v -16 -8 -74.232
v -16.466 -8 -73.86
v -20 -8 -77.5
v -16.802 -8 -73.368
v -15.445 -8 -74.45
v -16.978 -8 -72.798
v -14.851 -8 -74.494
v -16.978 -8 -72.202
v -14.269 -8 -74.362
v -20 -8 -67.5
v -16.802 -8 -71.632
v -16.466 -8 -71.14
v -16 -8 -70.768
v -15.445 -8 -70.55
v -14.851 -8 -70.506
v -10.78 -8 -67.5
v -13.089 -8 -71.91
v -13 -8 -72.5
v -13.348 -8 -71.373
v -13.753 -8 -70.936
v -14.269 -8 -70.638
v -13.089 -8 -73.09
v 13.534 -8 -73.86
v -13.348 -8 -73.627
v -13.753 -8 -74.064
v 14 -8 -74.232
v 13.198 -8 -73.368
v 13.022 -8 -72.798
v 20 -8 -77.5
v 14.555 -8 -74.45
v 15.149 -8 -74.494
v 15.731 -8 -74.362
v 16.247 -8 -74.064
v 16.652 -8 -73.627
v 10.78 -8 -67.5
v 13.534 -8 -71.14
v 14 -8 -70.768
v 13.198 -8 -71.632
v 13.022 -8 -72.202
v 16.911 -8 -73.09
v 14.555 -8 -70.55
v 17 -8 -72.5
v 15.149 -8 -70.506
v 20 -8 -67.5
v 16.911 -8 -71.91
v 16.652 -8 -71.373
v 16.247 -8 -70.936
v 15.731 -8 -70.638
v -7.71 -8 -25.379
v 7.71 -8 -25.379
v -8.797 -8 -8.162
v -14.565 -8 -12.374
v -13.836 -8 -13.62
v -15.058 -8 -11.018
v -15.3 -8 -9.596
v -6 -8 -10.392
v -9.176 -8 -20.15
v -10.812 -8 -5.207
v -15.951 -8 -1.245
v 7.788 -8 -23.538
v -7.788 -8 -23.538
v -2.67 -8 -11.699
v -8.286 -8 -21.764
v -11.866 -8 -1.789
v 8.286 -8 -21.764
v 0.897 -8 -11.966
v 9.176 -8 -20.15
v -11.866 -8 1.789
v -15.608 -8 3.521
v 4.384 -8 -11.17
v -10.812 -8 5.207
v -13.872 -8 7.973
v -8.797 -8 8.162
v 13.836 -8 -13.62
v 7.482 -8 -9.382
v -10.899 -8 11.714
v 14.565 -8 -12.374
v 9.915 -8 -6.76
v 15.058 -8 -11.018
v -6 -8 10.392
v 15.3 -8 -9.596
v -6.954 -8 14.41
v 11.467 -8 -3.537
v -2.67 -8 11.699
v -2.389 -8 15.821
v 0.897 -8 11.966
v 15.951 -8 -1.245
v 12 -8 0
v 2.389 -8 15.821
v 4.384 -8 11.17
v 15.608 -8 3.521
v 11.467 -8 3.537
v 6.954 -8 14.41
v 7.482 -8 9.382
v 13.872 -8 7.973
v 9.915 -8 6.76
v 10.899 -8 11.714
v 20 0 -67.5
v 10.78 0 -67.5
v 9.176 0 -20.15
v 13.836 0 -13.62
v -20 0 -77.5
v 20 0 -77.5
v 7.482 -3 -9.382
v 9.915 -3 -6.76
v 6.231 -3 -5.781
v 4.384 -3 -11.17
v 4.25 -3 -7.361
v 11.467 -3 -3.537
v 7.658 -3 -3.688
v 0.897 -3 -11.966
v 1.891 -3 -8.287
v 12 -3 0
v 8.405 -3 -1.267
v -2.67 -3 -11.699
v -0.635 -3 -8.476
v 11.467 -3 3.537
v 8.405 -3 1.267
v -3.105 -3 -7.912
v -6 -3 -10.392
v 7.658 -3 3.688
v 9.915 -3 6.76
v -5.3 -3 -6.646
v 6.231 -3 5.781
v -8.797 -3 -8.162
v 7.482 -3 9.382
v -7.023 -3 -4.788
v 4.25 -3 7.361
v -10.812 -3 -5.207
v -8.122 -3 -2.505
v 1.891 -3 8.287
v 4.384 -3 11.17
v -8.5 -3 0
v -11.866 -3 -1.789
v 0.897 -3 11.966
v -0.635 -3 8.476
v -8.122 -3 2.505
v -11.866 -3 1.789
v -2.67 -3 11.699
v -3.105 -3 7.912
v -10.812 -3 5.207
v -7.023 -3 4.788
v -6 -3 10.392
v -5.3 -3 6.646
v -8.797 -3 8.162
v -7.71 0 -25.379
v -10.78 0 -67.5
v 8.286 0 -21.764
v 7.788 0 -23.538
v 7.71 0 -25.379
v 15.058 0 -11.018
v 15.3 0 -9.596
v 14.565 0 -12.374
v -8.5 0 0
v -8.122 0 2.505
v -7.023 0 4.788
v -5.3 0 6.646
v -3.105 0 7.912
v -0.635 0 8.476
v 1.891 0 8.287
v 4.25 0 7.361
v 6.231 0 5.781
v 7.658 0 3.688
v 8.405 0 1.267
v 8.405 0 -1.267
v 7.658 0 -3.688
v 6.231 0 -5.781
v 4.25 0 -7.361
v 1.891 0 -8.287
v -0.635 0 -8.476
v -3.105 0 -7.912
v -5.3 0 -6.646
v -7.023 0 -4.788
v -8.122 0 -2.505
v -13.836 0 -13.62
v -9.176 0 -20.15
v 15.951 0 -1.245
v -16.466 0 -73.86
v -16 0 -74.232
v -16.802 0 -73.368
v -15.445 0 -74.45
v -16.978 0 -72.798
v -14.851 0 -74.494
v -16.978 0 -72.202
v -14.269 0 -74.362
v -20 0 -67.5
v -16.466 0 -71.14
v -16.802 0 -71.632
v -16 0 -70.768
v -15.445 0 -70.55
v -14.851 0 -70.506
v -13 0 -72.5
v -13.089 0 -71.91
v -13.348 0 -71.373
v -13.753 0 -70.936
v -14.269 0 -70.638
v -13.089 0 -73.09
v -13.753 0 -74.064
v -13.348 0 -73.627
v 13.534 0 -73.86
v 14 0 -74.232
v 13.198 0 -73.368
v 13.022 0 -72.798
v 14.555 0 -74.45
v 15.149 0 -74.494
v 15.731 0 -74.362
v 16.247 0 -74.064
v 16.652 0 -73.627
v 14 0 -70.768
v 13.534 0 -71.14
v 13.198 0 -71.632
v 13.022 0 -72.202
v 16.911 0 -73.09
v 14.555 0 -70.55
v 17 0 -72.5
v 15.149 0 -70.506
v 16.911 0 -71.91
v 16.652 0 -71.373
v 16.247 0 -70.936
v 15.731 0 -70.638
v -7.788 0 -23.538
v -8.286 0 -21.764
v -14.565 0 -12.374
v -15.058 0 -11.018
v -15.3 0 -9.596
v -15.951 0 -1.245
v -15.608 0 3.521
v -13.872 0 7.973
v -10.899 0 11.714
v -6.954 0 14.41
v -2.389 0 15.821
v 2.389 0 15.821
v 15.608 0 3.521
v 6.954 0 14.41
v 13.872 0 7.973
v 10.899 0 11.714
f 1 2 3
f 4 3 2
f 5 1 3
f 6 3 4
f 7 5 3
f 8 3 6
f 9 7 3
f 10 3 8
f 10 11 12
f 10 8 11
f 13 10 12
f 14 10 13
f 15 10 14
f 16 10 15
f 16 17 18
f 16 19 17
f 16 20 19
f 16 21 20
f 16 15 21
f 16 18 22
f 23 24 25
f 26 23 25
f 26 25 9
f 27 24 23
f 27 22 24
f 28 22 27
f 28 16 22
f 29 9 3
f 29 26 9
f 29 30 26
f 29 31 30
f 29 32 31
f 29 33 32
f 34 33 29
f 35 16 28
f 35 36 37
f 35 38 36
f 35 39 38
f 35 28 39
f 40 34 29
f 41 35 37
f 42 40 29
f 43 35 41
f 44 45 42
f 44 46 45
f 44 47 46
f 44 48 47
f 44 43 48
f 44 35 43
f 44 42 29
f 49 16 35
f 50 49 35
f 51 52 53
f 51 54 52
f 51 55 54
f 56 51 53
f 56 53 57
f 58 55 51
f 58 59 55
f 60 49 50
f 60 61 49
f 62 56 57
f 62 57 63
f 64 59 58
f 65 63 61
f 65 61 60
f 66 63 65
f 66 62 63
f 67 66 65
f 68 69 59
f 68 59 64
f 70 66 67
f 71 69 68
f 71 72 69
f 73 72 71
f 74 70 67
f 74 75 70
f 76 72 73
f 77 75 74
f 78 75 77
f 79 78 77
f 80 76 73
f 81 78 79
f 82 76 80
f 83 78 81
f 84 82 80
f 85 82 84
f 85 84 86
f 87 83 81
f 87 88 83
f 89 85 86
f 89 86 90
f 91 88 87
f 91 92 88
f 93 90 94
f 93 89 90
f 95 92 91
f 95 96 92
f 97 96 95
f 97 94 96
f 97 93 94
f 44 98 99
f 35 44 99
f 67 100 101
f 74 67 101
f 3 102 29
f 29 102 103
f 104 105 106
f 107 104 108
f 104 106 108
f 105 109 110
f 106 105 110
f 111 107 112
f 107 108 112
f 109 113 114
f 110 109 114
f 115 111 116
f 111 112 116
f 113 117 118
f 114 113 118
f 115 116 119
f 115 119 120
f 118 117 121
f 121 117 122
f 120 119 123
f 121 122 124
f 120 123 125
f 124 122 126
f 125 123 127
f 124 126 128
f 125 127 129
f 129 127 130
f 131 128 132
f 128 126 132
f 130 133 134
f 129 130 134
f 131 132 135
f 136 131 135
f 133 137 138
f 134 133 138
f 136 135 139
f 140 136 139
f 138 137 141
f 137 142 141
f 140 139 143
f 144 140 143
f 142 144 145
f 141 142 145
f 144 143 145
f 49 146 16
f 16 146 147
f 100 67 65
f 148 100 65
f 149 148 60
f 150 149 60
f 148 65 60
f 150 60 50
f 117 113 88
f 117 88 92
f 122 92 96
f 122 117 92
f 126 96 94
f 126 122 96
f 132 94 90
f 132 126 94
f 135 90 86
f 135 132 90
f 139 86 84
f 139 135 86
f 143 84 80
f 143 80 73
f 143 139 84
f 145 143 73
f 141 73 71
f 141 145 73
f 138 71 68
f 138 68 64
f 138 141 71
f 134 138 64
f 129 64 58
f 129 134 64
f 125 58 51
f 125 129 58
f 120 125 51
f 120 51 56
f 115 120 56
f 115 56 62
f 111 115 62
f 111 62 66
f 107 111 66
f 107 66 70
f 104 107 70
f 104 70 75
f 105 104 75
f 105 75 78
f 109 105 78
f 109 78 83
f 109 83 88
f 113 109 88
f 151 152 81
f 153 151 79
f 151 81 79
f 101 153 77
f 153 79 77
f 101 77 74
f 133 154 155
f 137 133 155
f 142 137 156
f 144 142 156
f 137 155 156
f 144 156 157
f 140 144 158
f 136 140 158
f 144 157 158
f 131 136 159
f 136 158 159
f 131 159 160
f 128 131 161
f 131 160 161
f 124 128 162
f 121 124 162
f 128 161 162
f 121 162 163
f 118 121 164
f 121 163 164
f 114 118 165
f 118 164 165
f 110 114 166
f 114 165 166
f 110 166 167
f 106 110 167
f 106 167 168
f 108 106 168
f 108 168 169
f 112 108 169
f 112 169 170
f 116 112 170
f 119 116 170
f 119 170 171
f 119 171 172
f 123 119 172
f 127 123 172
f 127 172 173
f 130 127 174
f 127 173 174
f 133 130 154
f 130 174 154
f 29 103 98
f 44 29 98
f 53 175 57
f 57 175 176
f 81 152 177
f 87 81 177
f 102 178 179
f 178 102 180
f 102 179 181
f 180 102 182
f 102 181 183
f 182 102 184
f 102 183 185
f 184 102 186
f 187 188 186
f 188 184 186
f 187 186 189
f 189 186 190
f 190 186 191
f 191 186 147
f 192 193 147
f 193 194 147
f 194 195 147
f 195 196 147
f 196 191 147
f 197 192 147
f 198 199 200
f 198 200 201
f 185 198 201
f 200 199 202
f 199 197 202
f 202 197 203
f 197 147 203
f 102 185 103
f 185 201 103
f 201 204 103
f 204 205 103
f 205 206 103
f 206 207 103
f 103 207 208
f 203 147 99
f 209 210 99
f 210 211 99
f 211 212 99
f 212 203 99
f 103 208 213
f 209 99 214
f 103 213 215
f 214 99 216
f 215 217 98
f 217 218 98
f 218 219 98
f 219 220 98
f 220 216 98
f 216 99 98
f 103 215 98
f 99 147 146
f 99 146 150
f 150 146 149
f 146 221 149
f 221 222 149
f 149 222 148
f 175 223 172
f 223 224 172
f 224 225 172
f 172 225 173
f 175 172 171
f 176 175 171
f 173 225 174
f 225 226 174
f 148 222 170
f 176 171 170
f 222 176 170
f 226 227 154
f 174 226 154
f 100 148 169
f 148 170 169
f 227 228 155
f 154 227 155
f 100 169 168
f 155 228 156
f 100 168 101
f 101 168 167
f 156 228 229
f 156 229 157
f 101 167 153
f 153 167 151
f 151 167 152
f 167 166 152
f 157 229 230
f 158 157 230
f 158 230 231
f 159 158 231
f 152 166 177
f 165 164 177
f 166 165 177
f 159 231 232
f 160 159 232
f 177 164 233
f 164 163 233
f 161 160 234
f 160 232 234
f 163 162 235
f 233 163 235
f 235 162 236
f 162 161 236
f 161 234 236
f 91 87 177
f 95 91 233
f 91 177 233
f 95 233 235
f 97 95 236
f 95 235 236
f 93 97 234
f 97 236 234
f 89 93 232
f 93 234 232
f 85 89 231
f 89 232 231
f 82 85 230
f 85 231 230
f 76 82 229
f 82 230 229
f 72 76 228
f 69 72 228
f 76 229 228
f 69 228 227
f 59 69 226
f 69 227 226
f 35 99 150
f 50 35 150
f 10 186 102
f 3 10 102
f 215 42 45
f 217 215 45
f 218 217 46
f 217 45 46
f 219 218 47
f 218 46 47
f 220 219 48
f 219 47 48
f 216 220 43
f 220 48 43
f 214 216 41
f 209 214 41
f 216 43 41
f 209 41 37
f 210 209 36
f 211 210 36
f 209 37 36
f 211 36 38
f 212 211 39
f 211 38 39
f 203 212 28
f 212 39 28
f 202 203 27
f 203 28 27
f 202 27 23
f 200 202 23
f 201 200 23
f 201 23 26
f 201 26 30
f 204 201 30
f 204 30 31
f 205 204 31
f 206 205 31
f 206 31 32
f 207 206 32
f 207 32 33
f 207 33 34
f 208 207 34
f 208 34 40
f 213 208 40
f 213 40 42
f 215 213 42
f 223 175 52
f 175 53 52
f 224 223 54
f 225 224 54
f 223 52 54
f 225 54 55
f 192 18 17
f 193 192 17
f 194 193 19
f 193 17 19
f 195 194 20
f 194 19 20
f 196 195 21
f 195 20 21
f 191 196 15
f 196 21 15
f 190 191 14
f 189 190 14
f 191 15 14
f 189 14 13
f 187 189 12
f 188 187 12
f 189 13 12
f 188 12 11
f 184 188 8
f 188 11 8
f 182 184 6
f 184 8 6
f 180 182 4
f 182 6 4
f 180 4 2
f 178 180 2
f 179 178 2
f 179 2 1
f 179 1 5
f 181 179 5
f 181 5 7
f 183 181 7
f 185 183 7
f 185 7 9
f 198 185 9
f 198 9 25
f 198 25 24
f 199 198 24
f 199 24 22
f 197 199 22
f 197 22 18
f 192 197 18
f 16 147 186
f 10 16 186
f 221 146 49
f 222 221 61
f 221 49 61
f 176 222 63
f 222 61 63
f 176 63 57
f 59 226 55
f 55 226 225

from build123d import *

# Parameters (mm, degrees)
F0_R     = 12
F1_DEPTH = 8
F3_DEPTH = 25
F4_R     = 8
F5_R     = 12
F5_R_2   = 8.5
F6_DEPTH = 3
F7_R     = 2
F8_DEPTH = 25


with BuildPart() as f1:
    # F0 (on Front) → F1 (new body)
    with BuildSketch(Plane.XZ):
        with BuildLine():
            Line((10.7804718609, -67.5), (15.9514905981, -1.2449689551))
            ThreePointArc((15.9514905981, -1.2449689551), (0, 16), (-15.9514905981, -1.2449689551))
            Line((-15.9514905981, -1.2449689551), (-10.7804718609, -67.5))
            Line((-10.7804718609, -67.5), (-20, -67.5))
            Line((-20, -67.5), (-20, -77.5))
            Line((-20, -77.5), (-10, -77.5))
            Line((-10, -77.5), (10, -77.5))
            Line((10, -77.5), (20, -77.5))
            Line((20, -77.5), (20, -67.5))
            Line((20, -67.5), (10.7804718609, -67.5))
        make_face()
        Circle(F0_R, mode=Mode.SUBTRACT)
    extrude(amount=F1_DEPTH)

    # F2 (on face) → F3 (cut)
    with BuildSketch(Plane(origin=(0, 0, 0), x_dir=(-1, 0, 0), z_dir=(0, 1, 0))):
        Polygon((-7.5, -22.5), (-15.1268365117, -11.8110652832), (-10.7804718609, -67.5), align=None)
        Polygon((10.7804718609, -67.5), (15.1268365117, -11.8110652832), (7.5, -22.5), align=None)
    extrude(amount=-F3_DEPTH, mode=Mode.SUBTRACT)

    # F4
    f4_edges = [f1.edges().sort_by_distance(p)[0] for p in [
        (-7.5, -4, -22.5),
        (-15.126837, -4, -11.811065),
        (15.126837, -4, -11.811065),
        (7.5, -4, -22.5),
    ]]
    fillet(f4_edges, radius=F4_R)

    # F5 (on face) → F6 (join)
    with BuildSketch(Plane(origin=(0, 0, 0), x_dir=(-1, 0, 0), z_dir=(0, 1, 0))):
        with BuildLine():
            Line((20, -67.5), (10.7804718609, -67.5))
            Line((10.7804718609, -67.5), (7.7098565421, -25.3787152568))
            ThreePointArc((7.7098565421, -25.3787152568), (7.9860060263, -22.6363328806), (9.1764777393, -20.150433298))
            Line((9.1764777393, -20.150433298), (13.8361972063, -13.6198832981))
            ThreePointArc((13.8361972063, -13.6198832981), (14.8422105338, -11.7075498191), (15.2997366254, -9.5957373215))
            Line((15.2997366254, -9.5957373215), (15.9514905981, -1.2449689551))
            ThreePointArc((15.9514905981, -1.2449689551), (0, 16), (-15.9514905981, -1.2449689551))
            Line((-15.9514905981, -1.2449689551), (-15.2997366254, -9.5957373215))
            ThreePointArc((-15.2997366254, -9.5957373215), (-14.8422105338, -11.7075498191), (-13.8361972063, -13.6198832981))
            Line((-13.8361972063, -13.6198832981), (-9.1764777393, -20.150433298))
            ThreePointArc((-9.1764777393, -20.150433298), (-7.9860060263, -22.6363328806), (-7.7098565421, -25.3787152568))
            Line((-7.7098565421, -25.3787152568), (-10.7804718609, -67.5))
            Line((-10.7804718609, -67.5), (-20, -67.5))
            Line((-20, -67.5), (-20, -77.5))
            Line((-20, -77.5), (20, -77.5))
            Line((20, -77.5), (20, -67.5))
        make_face()
        Circle(F5_R, mode=Mode.SUBTRACT)
        Circle(F5_R)
        Circle(F5_R_2, mode=Mode.SUBTRACT)
    extrude(amount=-F6_DEPTH)

    # F7 (on face) → F8 (cut)
    with BuildSketch(Plane.XZ.offset(8)):
        with Locations((-15, -72.5)):
            Circle(F7_R)
        with Locations((15, -72.5)):
            Circle(F7_R)
    extrude(amount=-F8_DEPTH, mode=Mode.SUBTRACT)


solid = f1.part
